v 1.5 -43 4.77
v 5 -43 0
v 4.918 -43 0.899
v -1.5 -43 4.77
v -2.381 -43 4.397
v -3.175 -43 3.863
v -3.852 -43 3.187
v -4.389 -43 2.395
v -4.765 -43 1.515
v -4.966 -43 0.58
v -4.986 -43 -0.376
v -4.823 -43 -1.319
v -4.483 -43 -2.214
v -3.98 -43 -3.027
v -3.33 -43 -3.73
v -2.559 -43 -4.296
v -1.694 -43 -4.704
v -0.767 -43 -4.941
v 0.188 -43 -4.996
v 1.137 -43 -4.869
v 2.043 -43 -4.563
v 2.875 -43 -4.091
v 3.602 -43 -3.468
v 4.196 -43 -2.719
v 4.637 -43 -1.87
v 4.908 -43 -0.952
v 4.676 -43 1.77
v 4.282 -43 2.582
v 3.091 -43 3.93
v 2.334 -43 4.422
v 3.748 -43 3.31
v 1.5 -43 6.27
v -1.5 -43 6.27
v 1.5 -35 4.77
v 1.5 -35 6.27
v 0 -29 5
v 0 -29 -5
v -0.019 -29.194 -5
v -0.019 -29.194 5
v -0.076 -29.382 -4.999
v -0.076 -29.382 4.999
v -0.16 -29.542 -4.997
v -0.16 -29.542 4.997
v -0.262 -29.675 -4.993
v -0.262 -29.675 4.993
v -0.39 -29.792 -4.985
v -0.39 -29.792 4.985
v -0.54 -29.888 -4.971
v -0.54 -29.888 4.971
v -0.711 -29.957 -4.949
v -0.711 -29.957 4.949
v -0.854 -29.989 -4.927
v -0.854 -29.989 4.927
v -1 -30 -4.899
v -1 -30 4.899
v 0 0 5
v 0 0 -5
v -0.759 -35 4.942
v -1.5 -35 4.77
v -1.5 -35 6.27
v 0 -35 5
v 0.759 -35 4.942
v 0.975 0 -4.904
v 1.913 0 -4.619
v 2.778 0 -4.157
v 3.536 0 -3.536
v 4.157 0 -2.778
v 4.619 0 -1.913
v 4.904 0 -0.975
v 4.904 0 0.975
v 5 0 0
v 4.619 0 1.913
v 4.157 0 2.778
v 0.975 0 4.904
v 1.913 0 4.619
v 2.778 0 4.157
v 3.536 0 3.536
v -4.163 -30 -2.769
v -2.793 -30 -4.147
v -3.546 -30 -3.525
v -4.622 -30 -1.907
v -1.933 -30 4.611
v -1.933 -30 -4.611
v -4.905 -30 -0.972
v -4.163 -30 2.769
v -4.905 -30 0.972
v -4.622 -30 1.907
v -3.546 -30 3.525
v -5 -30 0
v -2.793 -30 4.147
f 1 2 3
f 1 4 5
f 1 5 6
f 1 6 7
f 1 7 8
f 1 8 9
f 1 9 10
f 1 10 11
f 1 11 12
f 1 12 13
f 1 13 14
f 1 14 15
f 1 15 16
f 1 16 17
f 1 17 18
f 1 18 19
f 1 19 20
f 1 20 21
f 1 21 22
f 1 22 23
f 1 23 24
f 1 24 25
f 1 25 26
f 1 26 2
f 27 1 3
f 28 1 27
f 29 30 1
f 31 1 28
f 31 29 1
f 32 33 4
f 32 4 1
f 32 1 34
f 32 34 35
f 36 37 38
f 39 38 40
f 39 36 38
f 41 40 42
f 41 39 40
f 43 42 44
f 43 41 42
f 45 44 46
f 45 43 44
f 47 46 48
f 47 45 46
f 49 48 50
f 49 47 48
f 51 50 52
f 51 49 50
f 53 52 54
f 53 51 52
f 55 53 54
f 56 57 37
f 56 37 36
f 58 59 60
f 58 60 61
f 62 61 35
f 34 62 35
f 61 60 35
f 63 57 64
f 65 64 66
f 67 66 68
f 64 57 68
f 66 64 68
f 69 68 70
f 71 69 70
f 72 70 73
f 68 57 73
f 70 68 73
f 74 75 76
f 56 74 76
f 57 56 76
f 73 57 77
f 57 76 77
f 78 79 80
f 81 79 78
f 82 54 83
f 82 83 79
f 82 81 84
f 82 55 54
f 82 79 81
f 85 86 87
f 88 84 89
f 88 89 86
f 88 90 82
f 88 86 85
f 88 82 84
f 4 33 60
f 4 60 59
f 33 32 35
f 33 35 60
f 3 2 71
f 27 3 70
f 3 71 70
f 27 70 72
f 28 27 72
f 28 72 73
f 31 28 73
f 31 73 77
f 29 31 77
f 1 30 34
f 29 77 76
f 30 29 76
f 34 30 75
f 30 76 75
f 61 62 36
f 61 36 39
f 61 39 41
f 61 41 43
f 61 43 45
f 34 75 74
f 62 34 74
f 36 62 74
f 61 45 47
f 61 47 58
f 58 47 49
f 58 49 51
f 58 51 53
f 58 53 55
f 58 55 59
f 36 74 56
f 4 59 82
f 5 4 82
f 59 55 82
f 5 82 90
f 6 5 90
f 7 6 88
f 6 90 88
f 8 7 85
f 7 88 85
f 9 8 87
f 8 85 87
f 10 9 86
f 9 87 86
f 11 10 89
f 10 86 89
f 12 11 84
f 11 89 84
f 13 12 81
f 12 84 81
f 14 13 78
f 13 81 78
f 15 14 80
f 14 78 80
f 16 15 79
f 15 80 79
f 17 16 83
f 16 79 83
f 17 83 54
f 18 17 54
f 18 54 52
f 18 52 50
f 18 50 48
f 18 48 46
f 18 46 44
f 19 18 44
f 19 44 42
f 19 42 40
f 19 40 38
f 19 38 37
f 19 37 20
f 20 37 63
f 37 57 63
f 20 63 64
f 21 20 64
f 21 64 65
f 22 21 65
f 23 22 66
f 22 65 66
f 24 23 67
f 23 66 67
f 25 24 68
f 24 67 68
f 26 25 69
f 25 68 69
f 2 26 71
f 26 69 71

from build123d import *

# Parameters (mm, degrees)
F0_R     = 5
F1_DEPTH = 43
F3_DEPTH = 8
F4_W     = 6.116576
F4_H     = 10
F5_DEPTH = 30
F6_R     = 1


with BuildPart() as f1:
    # F0 (on Front) → F1 (new body)
    with BuildSketch(Plane.XZ):
        Circle(F0_R)
    extrude(amount=F1_DEPTH)

    # F2 (on face) → F3 (join)
    with BuildSketch(Plane.XZ.offset(43)):
        with BuildLine():
            Line((-1.5, 6.269696), (-1.5, 4.769696))
            ThreePointArc((-1.5, 4.769696), (0, 5), (1.5, 4.769696))
            Line((1.5, 4.769696), (1.5, 6.269696))
            Line((1.5, 6.269696), (-1.5, 6.269696))
        make_face()
    extrude(amount=-F3_DEPTH)

    # F4 (on face) → F5 (cut)
    with BuildSketch(Plane(origin=(0, 0, 0), x_dir=(-1, 0, 0), z_dir=(0, 1, 0))):
        with Locations((3.058288, 0)):
            Rectangle(F4_W, F4_H)
    extrude(amount=-F5_DEPTH, mode=Mode.SUBTRACT)

    # F6
    f6_edges = [f1.edges().sort_by_distance(p)[0] for p in [
        (0, -30, 0),
    ]]
    fillet(f6_edges, radius=F6_R)


solid = f1.part
